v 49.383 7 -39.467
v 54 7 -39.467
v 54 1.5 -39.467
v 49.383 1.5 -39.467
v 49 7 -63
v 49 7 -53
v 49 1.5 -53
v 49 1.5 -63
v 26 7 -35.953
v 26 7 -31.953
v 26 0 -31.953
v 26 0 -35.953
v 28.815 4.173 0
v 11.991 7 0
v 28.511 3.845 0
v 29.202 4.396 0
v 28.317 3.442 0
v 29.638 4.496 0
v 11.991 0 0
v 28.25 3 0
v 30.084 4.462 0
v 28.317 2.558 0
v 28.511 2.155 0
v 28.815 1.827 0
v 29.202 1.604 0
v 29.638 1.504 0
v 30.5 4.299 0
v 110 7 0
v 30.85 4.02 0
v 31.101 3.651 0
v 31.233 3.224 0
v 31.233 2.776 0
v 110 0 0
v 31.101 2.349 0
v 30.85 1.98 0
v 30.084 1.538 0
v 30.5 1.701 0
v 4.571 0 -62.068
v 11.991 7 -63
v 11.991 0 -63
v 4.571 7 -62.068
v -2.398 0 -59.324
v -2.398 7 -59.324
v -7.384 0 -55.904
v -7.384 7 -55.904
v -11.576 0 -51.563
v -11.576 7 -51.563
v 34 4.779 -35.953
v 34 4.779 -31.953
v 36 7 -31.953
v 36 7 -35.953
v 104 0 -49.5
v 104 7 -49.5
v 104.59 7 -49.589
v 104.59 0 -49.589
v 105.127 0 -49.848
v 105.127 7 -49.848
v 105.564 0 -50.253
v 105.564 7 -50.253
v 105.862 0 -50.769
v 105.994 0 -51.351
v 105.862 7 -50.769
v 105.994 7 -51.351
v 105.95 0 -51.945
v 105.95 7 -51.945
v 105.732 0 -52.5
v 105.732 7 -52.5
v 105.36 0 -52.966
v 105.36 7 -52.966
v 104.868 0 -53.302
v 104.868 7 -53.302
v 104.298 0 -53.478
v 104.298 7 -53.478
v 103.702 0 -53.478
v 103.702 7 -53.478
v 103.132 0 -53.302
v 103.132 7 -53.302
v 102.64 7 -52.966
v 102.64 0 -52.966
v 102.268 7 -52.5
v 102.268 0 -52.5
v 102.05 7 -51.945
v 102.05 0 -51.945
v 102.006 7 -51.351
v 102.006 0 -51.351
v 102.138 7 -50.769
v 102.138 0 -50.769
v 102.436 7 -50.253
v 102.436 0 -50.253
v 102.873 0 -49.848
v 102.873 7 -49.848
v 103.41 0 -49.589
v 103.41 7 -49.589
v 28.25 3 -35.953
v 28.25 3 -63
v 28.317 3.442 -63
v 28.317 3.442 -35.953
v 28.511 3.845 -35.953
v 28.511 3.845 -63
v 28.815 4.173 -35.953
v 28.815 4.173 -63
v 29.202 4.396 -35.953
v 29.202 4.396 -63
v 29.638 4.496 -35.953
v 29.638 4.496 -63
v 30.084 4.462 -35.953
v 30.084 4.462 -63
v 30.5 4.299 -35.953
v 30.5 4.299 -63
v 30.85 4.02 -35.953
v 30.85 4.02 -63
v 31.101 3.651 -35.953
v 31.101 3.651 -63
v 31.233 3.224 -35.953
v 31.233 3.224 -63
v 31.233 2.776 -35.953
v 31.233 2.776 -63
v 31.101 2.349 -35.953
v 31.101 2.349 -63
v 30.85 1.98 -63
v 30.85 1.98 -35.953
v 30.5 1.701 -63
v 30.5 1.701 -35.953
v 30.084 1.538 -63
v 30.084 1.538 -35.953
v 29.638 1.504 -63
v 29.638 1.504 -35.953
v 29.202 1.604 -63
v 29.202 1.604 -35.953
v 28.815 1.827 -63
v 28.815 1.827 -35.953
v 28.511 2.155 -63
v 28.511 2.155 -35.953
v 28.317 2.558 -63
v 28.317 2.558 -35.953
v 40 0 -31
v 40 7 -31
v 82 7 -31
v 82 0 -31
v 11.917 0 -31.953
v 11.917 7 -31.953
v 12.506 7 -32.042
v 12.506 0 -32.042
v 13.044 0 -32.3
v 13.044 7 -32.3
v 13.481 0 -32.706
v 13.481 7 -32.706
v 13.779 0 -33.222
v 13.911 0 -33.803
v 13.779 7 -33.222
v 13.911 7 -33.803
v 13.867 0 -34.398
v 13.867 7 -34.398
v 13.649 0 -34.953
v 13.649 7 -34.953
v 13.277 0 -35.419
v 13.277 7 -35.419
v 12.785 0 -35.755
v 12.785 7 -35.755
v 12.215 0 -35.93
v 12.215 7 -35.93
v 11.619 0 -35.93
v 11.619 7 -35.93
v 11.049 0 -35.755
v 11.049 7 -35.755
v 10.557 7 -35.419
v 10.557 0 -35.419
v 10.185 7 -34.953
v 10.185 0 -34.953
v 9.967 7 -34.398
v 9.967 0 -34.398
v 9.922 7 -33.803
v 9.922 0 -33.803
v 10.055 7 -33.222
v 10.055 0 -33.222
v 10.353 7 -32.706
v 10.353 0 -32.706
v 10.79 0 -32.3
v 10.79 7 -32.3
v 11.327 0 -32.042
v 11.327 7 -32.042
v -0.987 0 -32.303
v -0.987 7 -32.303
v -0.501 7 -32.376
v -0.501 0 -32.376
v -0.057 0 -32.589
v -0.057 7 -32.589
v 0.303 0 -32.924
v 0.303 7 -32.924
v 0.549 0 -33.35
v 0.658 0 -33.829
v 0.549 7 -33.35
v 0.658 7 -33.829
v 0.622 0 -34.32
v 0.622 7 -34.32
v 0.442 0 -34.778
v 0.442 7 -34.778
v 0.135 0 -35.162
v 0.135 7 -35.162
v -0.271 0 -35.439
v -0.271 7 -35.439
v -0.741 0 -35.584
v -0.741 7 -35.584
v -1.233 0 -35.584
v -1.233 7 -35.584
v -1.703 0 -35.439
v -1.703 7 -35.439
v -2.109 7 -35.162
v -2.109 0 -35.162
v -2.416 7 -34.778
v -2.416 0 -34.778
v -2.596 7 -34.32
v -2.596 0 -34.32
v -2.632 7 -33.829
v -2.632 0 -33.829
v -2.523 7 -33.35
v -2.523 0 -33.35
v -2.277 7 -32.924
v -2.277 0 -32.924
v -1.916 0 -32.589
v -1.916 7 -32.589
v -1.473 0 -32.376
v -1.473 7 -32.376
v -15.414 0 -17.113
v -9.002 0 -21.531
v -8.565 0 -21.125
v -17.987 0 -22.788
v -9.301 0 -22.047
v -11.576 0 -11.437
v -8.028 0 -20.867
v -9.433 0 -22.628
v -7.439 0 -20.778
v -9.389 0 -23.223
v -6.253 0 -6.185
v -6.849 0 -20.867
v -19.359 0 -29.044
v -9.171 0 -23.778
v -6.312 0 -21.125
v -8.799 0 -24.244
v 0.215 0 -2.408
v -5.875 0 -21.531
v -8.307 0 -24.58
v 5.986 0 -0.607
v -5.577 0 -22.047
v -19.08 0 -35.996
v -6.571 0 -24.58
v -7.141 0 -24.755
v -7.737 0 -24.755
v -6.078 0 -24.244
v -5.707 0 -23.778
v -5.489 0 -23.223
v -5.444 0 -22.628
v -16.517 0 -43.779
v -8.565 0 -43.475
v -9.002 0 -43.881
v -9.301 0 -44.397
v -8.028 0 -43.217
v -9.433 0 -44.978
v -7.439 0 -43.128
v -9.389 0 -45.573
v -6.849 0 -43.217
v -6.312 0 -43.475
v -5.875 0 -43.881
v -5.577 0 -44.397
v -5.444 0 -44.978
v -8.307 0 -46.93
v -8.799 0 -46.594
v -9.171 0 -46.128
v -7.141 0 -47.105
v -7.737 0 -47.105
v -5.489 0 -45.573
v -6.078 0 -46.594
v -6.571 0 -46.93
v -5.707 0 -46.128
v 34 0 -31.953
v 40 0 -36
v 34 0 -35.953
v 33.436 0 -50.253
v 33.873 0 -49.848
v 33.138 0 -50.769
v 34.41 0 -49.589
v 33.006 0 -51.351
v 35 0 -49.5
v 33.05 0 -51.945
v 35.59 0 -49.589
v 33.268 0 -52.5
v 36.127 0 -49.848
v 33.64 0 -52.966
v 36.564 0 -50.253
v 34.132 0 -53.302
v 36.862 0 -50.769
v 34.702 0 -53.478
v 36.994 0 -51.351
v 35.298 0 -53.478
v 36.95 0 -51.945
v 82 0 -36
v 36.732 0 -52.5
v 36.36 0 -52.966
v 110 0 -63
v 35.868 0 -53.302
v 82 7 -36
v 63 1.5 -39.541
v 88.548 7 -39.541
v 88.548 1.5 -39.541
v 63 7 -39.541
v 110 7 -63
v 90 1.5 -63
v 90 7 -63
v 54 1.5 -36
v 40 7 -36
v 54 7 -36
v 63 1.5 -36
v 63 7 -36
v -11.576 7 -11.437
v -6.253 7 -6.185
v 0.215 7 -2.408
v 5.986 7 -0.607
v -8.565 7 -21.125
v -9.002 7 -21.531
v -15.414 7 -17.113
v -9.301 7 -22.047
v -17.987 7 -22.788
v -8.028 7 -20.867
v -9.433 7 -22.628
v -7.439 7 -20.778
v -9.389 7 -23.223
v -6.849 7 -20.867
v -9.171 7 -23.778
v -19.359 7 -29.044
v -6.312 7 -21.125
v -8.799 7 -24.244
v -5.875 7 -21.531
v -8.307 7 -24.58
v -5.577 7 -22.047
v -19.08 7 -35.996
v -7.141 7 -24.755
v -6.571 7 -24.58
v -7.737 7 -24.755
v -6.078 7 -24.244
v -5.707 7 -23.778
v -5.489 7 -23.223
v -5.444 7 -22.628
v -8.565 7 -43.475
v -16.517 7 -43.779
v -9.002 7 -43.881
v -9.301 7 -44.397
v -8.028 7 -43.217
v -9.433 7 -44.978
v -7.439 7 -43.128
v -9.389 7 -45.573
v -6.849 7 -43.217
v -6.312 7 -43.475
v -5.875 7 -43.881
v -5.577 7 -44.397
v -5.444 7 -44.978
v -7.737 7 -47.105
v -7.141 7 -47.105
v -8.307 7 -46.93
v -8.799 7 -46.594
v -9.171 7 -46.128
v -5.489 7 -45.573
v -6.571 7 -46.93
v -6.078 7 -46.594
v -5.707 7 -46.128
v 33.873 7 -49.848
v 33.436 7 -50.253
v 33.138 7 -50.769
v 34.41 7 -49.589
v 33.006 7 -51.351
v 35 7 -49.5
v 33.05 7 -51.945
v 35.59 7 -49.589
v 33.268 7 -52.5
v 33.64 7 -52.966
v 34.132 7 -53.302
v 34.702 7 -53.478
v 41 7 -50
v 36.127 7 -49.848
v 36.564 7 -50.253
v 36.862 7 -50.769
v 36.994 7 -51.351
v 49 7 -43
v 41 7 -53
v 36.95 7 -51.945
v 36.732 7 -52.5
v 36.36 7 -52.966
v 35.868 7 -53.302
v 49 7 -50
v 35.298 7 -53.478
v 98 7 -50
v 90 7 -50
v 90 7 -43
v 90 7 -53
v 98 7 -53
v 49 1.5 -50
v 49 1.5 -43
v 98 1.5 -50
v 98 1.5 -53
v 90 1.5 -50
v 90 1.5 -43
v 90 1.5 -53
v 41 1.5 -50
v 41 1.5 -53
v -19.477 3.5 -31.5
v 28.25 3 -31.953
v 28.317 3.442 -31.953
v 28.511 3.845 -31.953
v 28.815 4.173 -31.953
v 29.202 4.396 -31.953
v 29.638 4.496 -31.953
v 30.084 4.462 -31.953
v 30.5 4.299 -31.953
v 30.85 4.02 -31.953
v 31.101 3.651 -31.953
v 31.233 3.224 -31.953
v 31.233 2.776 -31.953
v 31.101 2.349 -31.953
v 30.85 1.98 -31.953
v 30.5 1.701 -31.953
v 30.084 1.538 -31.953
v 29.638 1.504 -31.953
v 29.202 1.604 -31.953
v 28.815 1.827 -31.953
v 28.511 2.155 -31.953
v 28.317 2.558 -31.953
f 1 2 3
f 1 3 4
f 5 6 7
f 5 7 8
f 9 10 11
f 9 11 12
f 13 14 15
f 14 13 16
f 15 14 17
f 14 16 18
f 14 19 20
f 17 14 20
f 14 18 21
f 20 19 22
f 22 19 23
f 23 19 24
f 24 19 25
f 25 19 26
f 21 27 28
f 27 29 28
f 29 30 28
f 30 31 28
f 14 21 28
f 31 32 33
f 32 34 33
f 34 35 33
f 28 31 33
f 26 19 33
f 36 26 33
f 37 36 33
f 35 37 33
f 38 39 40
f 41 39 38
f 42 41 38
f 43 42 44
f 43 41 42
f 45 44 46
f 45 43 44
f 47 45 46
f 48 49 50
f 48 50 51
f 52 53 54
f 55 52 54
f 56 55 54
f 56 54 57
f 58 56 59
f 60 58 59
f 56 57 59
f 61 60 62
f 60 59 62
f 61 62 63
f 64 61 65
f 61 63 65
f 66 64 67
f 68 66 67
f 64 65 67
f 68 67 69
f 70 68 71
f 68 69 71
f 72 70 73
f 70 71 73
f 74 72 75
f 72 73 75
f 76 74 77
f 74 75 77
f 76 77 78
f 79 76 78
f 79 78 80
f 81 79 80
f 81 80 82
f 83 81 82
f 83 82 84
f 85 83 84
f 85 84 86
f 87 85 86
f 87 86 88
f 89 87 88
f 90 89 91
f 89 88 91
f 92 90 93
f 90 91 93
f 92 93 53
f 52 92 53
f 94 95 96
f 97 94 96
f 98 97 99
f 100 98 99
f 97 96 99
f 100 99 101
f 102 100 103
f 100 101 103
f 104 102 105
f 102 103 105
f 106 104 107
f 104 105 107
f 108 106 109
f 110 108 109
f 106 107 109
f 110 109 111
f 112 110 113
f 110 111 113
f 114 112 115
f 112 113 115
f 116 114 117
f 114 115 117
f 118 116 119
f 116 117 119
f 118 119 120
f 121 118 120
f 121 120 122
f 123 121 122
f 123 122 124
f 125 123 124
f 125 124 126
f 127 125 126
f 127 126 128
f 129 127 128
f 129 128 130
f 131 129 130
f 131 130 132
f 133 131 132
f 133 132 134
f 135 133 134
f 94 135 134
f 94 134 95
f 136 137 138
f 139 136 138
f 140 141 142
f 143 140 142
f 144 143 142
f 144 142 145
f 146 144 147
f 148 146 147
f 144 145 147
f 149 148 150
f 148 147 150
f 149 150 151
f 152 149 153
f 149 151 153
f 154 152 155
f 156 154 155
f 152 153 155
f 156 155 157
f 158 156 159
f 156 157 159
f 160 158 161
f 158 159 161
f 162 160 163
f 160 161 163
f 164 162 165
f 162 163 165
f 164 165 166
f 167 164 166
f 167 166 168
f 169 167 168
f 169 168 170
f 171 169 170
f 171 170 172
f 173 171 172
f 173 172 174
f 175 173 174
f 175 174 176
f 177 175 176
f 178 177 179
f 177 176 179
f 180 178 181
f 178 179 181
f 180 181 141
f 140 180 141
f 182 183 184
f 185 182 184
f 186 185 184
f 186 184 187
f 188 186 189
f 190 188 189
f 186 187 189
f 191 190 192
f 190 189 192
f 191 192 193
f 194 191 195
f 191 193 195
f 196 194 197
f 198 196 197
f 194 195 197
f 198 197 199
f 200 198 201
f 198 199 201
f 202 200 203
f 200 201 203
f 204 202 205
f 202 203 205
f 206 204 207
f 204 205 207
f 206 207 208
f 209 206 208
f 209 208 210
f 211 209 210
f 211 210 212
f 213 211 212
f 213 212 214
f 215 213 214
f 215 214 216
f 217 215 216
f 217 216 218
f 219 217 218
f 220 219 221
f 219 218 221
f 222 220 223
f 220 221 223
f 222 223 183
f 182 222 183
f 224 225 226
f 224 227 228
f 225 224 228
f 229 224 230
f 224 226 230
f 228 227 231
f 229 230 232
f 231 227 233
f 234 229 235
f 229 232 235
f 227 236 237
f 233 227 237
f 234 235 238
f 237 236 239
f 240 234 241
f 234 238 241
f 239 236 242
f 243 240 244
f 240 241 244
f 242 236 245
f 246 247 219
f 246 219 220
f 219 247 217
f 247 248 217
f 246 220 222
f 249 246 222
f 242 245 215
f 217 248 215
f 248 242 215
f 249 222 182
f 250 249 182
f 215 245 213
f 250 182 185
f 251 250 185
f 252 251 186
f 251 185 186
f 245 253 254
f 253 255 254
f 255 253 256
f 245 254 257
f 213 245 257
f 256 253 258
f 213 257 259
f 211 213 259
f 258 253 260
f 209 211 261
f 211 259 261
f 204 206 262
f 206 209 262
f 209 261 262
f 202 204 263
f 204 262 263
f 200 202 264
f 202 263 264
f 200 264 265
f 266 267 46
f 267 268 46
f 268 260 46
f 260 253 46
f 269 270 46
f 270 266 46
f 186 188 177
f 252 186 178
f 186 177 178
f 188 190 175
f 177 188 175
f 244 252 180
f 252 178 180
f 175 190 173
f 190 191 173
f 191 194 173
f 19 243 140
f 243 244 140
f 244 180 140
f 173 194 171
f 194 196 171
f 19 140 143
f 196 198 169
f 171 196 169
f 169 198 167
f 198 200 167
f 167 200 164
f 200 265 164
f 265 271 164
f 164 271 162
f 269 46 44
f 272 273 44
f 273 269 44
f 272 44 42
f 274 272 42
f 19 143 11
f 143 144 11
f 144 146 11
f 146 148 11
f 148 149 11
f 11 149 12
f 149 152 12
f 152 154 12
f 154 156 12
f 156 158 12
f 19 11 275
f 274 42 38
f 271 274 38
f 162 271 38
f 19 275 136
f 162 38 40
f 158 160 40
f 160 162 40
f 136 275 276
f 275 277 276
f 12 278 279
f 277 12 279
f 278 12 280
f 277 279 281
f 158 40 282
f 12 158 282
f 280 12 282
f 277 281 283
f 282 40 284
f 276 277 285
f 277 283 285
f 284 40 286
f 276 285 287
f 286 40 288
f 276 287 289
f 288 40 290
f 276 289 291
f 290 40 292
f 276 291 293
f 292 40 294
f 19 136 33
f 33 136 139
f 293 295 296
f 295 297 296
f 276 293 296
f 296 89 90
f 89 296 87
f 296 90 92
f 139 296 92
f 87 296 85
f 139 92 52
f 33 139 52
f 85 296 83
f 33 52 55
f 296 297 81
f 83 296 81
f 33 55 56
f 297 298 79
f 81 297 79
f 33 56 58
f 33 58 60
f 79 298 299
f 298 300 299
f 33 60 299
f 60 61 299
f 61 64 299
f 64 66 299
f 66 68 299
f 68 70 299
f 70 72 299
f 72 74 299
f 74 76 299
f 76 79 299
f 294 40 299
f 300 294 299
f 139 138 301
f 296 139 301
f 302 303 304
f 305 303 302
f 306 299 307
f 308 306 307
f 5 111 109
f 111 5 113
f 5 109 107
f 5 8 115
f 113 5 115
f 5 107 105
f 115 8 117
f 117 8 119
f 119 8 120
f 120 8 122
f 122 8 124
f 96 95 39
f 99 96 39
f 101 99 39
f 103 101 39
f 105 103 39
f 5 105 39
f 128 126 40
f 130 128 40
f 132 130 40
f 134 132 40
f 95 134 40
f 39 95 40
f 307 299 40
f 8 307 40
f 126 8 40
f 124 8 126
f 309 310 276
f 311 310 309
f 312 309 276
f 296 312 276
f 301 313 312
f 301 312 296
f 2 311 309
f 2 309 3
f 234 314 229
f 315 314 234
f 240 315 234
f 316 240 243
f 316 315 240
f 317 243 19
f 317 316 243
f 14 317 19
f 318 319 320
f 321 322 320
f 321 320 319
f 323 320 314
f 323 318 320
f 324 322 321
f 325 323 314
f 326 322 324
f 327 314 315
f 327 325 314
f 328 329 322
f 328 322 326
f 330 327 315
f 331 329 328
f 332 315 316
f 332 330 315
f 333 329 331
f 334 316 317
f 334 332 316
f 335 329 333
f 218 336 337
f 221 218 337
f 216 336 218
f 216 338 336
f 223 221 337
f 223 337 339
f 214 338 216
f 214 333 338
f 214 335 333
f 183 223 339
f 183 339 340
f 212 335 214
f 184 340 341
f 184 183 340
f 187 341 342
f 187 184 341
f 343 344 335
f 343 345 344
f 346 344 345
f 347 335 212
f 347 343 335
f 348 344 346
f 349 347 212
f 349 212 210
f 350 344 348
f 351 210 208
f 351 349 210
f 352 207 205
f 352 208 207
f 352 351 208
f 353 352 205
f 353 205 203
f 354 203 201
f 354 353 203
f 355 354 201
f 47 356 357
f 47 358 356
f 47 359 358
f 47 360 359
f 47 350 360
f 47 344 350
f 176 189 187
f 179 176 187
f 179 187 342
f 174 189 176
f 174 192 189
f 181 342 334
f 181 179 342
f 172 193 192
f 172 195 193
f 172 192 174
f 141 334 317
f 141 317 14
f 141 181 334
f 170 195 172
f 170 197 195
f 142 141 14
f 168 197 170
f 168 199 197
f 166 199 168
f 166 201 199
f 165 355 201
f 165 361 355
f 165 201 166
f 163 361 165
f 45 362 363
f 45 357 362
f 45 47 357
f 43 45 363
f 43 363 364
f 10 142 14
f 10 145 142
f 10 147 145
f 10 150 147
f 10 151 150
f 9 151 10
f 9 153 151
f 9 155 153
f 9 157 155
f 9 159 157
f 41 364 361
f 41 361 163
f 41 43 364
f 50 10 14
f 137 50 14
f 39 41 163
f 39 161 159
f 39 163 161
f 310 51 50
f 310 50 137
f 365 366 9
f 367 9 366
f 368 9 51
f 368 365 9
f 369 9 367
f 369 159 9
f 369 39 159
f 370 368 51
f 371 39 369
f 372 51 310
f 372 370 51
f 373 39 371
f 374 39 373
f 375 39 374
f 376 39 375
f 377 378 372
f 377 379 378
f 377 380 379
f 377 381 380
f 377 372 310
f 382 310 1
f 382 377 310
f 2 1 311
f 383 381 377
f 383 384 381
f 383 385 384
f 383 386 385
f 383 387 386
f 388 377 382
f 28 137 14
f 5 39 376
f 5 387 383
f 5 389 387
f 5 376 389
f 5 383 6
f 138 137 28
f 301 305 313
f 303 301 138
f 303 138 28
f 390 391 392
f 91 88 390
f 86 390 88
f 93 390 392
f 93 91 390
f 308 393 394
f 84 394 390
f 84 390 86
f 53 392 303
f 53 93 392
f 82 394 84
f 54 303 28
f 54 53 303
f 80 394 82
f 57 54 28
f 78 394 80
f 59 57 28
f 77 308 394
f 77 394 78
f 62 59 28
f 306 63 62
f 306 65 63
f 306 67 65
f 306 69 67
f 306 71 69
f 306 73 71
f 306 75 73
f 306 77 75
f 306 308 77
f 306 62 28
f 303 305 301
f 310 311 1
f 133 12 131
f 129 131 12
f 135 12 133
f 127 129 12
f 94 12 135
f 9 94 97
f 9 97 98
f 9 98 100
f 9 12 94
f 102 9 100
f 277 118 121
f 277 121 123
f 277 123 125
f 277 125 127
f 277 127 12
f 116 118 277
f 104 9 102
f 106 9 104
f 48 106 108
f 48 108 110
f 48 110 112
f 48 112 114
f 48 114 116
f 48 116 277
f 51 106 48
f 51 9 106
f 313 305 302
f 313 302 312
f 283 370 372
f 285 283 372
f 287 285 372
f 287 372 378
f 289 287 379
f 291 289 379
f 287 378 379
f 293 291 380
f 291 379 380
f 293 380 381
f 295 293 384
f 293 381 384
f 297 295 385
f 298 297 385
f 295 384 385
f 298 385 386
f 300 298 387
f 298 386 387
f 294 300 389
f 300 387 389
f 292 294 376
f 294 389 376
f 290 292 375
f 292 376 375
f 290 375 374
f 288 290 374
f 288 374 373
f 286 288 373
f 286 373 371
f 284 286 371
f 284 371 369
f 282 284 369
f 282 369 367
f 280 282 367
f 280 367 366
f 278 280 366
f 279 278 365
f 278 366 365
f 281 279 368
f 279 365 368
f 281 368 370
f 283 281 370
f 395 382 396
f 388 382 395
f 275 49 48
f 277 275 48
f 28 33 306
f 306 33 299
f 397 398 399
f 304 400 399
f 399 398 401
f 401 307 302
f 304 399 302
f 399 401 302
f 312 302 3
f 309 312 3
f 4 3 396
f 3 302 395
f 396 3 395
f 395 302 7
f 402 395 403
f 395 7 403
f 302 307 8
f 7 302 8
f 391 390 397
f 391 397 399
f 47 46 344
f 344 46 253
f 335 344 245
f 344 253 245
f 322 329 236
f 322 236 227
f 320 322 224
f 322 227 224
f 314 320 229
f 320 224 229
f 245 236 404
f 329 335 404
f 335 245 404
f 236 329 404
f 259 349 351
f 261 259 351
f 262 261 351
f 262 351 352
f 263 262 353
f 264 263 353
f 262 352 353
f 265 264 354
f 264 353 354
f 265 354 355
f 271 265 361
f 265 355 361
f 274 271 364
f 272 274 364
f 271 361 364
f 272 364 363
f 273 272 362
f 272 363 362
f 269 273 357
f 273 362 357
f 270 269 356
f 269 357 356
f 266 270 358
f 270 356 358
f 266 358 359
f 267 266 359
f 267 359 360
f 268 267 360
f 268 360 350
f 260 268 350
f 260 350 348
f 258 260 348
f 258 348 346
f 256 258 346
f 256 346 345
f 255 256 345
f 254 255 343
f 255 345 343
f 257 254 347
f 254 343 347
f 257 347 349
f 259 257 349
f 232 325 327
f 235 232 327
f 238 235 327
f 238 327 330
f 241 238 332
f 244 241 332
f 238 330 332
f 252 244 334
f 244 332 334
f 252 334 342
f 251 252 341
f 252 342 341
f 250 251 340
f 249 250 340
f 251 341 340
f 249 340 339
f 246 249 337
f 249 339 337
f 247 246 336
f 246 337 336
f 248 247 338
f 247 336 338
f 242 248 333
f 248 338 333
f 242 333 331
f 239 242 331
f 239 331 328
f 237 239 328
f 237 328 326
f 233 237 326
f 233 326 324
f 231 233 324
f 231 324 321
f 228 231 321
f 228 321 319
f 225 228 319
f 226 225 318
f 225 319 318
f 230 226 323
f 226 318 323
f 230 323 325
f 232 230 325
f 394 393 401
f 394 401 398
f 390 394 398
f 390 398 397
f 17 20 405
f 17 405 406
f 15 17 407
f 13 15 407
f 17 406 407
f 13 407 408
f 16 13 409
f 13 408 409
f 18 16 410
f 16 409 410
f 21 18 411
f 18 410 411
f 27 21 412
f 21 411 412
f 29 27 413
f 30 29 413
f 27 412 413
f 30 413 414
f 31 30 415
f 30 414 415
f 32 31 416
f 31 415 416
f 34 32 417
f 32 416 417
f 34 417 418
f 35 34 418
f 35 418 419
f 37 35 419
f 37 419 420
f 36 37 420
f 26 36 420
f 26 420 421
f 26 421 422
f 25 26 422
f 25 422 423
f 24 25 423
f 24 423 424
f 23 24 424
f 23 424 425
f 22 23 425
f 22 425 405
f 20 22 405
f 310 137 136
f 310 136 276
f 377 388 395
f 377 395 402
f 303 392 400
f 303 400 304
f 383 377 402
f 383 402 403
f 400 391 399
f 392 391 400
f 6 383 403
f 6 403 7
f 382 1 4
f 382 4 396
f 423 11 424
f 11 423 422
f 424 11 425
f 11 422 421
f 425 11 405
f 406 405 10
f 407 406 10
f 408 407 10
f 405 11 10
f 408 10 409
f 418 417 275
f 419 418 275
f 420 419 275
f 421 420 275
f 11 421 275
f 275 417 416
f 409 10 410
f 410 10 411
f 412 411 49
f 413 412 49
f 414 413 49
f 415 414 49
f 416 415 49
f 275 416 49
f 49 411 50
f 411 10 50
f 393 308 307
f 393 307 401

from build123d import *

# Parameters (mm, degrees)
BOSS_EXTRU_1_DEPTH      = 7
ENL_V_MAT_EXTRU_1_DEPTH = 5.5
ESQUISSE3_W             = 42
ESQUISSE3_H             = 5
ENL_V_MAT_EXTRU_2_DEPTH = 7
ESQUISSE4_R             = 2
ENL_V_MAT_EXTRU_3_DEPTH = 7
ESQUISSE5_W             = 8
ESQUISSE5_H             = 4
ENL_V_MAT_EXTRU_4_DEPTH = 7
CHANFREIN1_SIZE         = 2
CHANFREIN1_SIZE2        = 2.22122503
ESQUISSE6_R             = 2
ESQUISSE6_R_2           = 1.65
ENL_V_MAT_EXTRU_5_DEPTH = 7
ESQUISSE7_R             = 1.5
ENL_V_MAT_EXTRU_6_DEPTH = 67
CONG_1_R                = 30


with BuildPart() as part:
    # Esquisse1 → Boss.-Extru.1 (new body)
    with BuildSketch(Plane(origin=(0, 0, 0), x_dir=(1, 0, 0), z_dir=(0, 1, 0))):
        with BuildLine():
            Line((0, 0), (110, 0))
            Line((110, 0), (110, 63))
            Line((110, 63), (0, 63))
            add(Edge.make_bspline(
                [(0, 63), (-38.954434005, 31.5), (0, 0)],
                knots=[0, 0, 0, 1, 1, 1], degree=2))
        make_face()
    extrude(amount=BOSS_EXTRU_1_DEPTH)

    # Esquisse2 → Enlèv. mat.-Extru.1 (cut)
    with BuildSketch(Plane(origin=(0, 7, 0), x_dir=(1, 0, 0), z_dir=(0, 1, 0))):
        Polygon((90, 63), (90, 53), (98, 53), (98, 50), (90, 50), (90, 43), (88.548308046, 39.540825664), (63, 39.540825664), (63, 35.886046781), (54, 35.886046781), (54, 39.466527525), (49.383125702, 39.466527525), (49, 43), (49, 50), (41, 50), (41, 53), (49, 53), (49, 63), align=None)
    extrude(amount=-ENL_V_MAT_EXTRU_1_DEPTH, mode=Mode.SUBTRACT)

    # Esquisse3 → Enlèv. mat.-Extru.2 (cut)
    with BuildSketch(Plane(origin=(0, 7, 0), x_dir=(1, 0, 0), z_dir=(0, 1, 0))):
        with Locations((61, 33.5)):
            Rectangle(ESQUISSE3_W, ESQUISSE3_H)
    extrude(amount=-ENL_V_MAT_EXTRU_2_DEPTH, mode=Mode.SUBTRACT)

    # Esquisse4 → Enlèv. mat.-Extru.3 (cut)
    with BuildSketch(Plane(origin=(0, 7, 0), x_dir=(1, 0, 0), z_dir=(0, 1, 0))):
        with Locations(Location((104, 51.5, 0), (0, 0, 270))):
            Circle(ESQUISSE4_R)
        with Locations(Location((35, 51.5, 0), (0, 0, 270))):
            Circle(ESQUISSE4_R)
    extrude(amount=-ENL_V_MAT_EXTRU_3_DEPTH, mode=Mode.SUBTRACT)

    # Esquisse5 → Enlèv. mat.-Extru.4 (cut)
    with BuildSketch(Plane(origin=(0, 7, 0), x_dir=(1, 0, 0), z_dir=(0, 1, 0))):
        with Locations((30, 33.95274738)):
            Rectangle(ESQUISSE5_W, ESQUISSE5_H)
    extrude(amount=-ENL_V_MAT_EXTRU_4_DEPTH, mode=Mode.SUBTRACT)

    # Chanfrein1
    chanfrein1_edges = [part.edges().sort_by_distance(p)[0] for p in [
        (34, 7, -33.95274738),
    ]]
    chanfrein1_side = [part.faces().sort_by_distance(p)[0] for p in [
        (44.621272822, 7, -28.216818426),
    ]]
    chamfer(chanfrein1_edges, length=CHANFREIN1_SIZE, length2=CHANFREIN1_SIZE2, reference=chanfrein1_side[0])

    # Esquisse6 → Enlèv. mat.-Extru.5 (cut)
    with BuildSketch(Plane(origin=(0, 7, 0), x_dir=(1, 0, 0), z_dir=(0, 1, 0))):
        with Locations(Location((11.916860307, 33.95274738, 0), (0, 0, 270))):
            Circle(ESQUISSE6_R)
        with Locations(Location((-7.438807468, 45.12774738, 0), (0, 0, 270))):
            Circle(ESQUISSE6_R)
        with Locations(Location((-7.438807468, 22.77774738, 0), (0, 0, 270))):
            Circle(ESQUISSE6_R)
        with Locations(Location((-0.986918209, 33.95274738, 0), (0, 0, 270))):
            Circle(ESQUISSE6_R_2)
    extrude(amount=-ENL_V_MAT_EXTRU_5_DEPTH, mode=Mode.SUBTRACT)

    # Esquisse7 → Enlèv. mat.-Extru.6 (cut)
    with BuildSketch(Plane(origin=(0, 0, -63), x_dir=(-1, 0, 0), z_dir=(0, 0, -1))):
        with Locations((-29.749983128, 3)):
            Circle(ESQUISSE7_R)
    extrude(amount=-ENL_V_MAT_EXTRU_6_DEPTH, mode=Mode.SUBTRACT)

    # Congé1
    cong_1_edges = [part.edges().sort_by_distance(p)[0] for p in [
        (0, 3.5, 0),
        (0, 3.5, -63),
    ]]
    fillet(cong_1_edges, radius=CONG_1_R)


solid = part.part
